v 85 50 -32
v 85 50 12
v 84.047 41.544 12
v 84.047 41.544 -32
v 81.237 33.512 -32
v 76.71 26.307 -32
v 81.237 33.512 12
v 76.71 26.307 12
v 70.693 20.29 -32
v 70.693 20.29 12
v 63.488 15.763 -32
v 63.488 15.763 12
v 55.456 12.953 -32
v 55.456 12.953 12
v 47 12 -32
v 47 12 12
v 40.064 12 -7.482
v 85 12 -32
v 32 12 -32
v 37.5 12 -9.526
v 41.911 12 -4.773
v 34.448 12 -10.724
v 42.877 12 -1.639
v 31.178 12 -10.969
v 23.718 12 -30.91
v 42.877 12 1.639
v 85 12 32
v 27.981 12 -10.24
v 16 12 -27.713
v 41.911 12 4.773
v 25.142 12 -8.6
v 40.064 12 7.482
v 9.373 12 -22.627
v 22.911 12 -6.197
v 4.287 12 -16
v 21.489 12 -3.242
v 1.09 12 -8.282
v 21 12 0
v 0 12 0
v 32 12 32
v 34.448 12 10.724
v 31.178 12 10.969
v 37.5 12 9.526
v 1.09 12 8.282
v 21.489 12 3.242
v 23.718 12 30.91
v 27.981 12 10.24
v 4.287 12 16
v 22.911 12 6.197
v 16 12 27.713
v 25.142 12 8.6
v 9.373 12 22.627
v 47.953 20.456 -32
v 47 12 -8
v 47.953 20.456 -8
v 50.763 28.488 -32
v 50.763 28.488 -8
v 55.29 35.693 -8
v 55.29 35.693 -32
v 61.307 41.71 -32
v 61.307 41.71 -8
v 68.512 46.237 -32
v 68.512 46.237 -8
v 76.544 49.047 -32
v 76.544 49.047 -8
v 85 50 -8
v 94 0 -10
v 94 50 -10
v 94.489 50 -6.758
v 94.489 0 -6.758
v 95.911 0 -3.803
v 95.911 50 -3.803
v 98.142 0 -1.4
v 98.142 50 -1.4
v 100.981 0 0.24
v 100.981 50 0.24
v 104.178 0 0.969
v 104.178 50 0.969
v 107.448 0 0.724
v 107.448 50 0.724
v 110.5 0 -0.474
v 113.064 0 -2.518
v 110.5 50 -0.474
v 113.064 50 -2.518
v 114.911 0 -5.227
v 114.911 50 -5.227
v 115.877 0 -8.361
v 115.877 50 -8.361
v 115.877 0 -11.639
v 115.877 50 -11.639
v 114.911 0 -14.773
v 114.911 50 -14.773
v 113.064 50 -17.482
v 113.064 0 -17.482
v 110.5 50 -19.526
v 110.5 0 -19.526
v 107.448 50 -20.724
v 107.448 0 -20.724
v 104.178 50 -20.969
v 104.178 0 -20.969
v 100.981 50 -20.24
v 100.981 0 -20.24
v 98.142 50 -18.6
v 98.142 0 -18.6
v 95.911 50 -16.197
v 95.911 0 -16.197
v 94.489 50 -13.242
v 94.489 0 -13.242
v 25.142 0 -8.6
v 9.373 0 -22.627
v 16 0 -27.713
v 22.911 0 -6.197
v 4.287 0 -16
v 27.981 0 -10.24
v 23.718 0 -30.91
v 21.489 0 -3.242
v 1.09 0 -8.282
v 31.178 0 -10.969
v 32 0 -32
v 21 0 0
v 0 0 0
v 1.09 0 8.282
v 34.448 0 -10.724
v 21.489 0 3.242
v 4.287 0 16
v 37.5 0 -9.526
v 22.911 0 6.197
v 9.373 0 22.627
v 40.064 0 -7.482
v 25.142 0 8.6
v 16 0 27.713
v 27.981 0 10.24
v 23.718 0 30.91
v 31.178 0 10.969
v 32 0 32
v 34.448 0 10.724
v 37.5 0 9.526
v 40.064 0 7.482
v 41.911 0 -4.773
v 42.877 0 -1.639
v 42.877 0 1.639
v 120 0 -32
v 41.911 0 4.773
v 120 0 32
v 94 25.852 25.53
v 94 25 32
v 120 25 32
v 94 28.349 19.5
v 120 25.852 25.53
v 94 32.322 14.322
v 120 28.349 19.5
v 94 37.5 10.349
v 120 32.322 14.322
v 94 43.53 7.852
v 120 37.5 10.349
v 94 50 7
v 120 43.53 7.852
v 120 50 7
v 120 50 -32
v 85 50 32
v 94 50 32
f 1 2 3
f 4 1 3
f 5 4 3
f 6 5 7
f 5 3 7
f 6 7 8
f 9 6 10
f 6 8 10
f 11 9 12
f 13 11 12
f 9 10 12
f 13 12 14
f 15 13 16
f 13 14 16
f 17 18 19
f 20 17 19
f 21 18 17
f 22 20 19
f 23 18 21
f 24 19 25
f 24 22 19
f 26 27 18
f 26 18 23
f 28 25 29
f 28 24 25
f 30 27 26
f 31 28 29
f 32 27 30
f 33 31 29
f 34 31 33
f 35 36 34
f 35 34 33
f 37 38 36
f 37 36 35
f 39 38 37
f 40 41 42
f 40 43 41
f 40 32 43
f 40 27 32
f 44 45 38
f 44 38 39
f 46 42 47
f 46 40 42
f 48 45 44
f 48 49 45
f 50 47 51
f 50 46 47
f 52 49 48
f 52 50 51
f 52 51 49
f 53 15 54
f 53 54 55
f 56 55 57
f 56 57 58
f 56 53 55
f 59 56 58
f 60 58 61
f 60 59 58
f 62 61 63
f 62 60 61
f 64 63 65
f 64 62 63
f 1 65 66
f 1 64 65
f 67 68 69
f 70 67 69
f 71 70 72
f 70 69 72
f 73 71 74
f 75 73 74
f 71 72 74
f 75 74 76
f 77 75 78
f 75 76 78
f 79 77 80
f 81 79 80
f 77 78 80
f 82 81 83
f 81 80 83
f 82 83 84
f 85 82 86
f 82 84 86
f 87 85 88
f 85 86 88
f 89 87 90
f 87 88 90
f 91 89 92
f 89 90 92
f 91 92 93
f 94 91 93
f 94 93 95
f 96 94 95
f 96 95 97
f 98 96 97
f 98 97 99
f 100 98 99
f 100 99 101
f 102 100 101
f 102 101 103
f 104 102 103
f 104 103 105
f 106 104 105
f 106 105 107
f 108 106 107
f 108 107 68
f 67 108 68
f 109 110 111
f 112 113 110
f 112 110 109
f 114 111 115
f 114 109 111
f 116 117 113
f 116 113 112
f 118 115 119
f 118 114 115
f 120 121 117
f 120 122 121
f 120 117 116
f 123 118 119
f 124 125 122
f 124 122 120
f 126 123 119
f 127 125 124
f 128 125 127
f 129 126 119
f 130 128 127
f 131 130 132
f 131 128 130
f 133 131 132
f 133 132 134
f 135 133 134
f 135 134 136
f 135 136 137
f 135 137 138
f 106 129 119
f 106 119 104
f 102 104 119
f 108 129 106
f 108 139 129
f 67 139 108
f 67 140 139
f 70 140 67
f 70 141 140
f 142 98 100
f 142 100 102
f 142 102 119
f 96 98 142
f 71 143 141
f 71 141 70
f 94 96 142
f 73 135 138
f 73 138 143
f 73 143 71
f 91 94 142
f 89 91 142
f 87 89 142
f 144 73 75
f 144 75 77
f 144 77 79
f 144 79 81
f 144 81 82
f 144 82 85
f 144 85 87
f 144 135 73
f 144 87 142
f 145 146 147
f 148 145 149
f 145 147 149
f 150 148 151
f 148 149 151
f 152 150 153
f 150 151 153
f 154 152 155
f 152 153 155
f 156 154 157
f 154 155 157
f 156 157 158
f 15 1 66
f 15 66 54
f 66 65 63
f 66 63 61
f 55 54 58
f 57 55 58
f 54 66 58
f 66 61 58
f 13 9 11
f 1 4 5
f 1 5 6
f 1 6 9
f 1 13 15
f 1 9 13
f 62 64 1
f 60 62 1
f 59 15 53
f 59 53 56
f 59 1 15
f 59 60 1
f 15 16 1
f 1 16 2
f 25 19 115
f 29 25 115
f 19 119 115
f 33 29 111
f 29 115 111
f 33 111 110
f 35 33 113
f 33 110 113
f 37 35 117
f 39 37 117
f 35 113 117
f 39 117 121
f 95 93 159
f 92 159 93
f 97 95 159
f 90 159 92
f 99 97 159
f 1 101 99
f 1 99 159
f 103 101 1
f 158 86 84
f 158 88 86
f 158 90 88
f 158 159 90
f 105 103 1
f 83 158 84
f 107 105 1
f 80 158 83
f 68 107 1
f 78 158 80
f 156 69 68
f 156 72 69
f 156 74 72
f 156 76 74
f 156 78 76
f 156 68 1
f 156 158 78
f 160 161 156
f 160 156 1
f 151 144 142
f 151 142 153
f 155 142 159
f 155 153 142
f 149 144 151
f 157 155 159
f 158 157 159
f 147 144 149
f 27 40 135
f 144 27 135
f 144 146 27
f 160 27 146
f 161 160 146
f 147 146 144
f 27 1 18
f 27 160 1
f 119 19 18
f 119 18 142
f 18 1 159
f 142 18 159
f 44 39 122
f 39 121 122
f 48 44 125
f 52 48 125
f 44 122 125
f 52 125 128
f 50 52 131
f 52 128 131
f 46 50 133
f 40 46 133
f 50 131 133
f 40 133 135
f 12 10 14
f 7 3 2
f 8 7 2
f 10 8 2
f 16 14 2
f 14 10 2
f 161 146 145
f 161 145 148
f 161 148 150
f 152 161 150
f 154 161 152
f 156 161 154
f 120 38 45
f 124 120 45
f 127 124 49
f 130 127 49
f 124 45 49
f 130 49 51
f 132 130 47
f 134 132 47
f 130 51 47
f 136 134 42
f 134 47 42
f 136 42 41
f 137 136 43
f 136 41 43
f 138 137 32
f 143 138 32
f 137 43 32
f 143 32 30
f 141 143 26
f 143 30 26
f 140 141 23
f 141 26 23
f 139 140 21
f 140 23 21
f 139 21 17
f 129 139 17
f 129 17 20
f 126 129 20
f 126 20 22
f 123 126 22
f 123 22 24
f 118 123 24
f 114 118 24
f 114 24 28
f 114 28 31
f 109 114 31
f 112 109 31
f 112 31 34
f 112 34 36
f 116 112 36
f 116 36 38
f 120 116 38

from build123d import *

# Parameters (mm, degrees)
SKETCH1_W           = 26
SKETCH1_H           = 25
BOSS_EXTRUDE1_DEPTH = 32
BOSS_EXTRUDE2_START = -32
BOSS_EXTRUDE2_DEPTH = 24
BOSS_EXTRUDE3_START = 12
BOSS_EXTRUDE3_DEPTH = 44
SKETCH2_R           = 25
CUT_EXTRUDE2_DEPTH  = 26
SKETCH3_R           = 11
CUT_EXTRUDE3_DEPTH  = 130.87686476
FILLET1_R           = 32
SKETCH4_R           = 11
CUT_EXTRUDE4_DEPTH  = 134.880543769


with BuildPart() as part:
    # Sketch1 → Boss-Extrude1 (new, symmetric)
    with BuildSketch(Plane.XY):
        Polygon((120, 12), (85, 12), (47, 12), (0, 12), (0, 0), (120, 0), align=None)
        Polygon((85, 50), (85, 12), (120, 12), (120, 25), (94, 25), (94, 50), align=None)
        with Locations((107, 37.5)):
            Rectangle(SKETCH1_W, SKETCH1_H)
    extrude(amount=BOSS_EXTRUDE1_DEPTH, both=True)

    # Sketch2 → Cut-Extrude2 (cut)
    with BuildSketch(Plane(origin=(120, 0, 0), x_dir=(0, 0, -1), z_dir=(1, 0, 0))):
        with Locations((-32, 50)):
            Circle(SKETCH2_R)
    extrude(amount=-CUT_EXTRUDE2_DEPTH, mode=Mode.SUBTRACT)

    # Sketch3 → Cut-Extrude3 (cut, through all)
    with BuildSketch(Plane(origin=(0, 12, 0), x_dir=(1, 0, 0), z_dir=(0, 1, 0))):
        with Locations(Location((32, 0, 0), (0, 0, 180))):
            Circle(SKETCH3_R)
    extrude(amount=-CUT_EXTRUDE3_DEPTH, mode=Mode.SUBTRACT)

    # Fillet1
    fillet1_edges = [part.edges().sort_by_distance(p)[0] for p in [
        (0, 6, -32),
        (0, 6, 32),
    ]]
    fillet(fillet1_edges, radius=FILLET1_R - 0.0001)  # a hair under: the kernel refuses the full size

    # Sketch4 → Cut-Extrude4 (cut, through all)
    with BuildSketch(Plane(origin=(0, 50, 0), x_dir=(1, 0, 0), z_dir=(0, 1, 0))):
        with Locations(Location((105, 10, 0), (0, 0, 180))):
            Circle(SKETCH4_R)
    extrude(amount=-CUT_EXTRUDE4_DEPTH, mode=Mode.SUBTRACT)


with BuildPart() as body_2:
    # Sketch1<3> → Boss-Extrude2 (new body)
    with BuildSketch(Plane.XY.offset(BOSS_EXTRUDE2_START)):
        with BuildLine():
            ThreePointArc((47, 12), (58.129942315, 38.870057685), (85, 50))
            Line((85, 50), (47, 12))
        make_face()
    extrude(amount=BOSS_EXTRUDE2_DEPTH)


with BuildPart() as body_3:
    # Sketch1<4> → Boss-Extrude3 (new body)
    with BuildSketch(Plane.XY.offset(BOSS_EXTRUDE3_START)):
        with BuildLine():
            Line((47, 12), (85, 50))
            ThreePointArc((85, 50), (73.870057685, 23.129942315), (47, 12))
        make_face()
    extrude(amount=-BOSS_EXTRUDE3_DEPTH)


solid = Compound([part.part, body_2.part, body_3.part])
